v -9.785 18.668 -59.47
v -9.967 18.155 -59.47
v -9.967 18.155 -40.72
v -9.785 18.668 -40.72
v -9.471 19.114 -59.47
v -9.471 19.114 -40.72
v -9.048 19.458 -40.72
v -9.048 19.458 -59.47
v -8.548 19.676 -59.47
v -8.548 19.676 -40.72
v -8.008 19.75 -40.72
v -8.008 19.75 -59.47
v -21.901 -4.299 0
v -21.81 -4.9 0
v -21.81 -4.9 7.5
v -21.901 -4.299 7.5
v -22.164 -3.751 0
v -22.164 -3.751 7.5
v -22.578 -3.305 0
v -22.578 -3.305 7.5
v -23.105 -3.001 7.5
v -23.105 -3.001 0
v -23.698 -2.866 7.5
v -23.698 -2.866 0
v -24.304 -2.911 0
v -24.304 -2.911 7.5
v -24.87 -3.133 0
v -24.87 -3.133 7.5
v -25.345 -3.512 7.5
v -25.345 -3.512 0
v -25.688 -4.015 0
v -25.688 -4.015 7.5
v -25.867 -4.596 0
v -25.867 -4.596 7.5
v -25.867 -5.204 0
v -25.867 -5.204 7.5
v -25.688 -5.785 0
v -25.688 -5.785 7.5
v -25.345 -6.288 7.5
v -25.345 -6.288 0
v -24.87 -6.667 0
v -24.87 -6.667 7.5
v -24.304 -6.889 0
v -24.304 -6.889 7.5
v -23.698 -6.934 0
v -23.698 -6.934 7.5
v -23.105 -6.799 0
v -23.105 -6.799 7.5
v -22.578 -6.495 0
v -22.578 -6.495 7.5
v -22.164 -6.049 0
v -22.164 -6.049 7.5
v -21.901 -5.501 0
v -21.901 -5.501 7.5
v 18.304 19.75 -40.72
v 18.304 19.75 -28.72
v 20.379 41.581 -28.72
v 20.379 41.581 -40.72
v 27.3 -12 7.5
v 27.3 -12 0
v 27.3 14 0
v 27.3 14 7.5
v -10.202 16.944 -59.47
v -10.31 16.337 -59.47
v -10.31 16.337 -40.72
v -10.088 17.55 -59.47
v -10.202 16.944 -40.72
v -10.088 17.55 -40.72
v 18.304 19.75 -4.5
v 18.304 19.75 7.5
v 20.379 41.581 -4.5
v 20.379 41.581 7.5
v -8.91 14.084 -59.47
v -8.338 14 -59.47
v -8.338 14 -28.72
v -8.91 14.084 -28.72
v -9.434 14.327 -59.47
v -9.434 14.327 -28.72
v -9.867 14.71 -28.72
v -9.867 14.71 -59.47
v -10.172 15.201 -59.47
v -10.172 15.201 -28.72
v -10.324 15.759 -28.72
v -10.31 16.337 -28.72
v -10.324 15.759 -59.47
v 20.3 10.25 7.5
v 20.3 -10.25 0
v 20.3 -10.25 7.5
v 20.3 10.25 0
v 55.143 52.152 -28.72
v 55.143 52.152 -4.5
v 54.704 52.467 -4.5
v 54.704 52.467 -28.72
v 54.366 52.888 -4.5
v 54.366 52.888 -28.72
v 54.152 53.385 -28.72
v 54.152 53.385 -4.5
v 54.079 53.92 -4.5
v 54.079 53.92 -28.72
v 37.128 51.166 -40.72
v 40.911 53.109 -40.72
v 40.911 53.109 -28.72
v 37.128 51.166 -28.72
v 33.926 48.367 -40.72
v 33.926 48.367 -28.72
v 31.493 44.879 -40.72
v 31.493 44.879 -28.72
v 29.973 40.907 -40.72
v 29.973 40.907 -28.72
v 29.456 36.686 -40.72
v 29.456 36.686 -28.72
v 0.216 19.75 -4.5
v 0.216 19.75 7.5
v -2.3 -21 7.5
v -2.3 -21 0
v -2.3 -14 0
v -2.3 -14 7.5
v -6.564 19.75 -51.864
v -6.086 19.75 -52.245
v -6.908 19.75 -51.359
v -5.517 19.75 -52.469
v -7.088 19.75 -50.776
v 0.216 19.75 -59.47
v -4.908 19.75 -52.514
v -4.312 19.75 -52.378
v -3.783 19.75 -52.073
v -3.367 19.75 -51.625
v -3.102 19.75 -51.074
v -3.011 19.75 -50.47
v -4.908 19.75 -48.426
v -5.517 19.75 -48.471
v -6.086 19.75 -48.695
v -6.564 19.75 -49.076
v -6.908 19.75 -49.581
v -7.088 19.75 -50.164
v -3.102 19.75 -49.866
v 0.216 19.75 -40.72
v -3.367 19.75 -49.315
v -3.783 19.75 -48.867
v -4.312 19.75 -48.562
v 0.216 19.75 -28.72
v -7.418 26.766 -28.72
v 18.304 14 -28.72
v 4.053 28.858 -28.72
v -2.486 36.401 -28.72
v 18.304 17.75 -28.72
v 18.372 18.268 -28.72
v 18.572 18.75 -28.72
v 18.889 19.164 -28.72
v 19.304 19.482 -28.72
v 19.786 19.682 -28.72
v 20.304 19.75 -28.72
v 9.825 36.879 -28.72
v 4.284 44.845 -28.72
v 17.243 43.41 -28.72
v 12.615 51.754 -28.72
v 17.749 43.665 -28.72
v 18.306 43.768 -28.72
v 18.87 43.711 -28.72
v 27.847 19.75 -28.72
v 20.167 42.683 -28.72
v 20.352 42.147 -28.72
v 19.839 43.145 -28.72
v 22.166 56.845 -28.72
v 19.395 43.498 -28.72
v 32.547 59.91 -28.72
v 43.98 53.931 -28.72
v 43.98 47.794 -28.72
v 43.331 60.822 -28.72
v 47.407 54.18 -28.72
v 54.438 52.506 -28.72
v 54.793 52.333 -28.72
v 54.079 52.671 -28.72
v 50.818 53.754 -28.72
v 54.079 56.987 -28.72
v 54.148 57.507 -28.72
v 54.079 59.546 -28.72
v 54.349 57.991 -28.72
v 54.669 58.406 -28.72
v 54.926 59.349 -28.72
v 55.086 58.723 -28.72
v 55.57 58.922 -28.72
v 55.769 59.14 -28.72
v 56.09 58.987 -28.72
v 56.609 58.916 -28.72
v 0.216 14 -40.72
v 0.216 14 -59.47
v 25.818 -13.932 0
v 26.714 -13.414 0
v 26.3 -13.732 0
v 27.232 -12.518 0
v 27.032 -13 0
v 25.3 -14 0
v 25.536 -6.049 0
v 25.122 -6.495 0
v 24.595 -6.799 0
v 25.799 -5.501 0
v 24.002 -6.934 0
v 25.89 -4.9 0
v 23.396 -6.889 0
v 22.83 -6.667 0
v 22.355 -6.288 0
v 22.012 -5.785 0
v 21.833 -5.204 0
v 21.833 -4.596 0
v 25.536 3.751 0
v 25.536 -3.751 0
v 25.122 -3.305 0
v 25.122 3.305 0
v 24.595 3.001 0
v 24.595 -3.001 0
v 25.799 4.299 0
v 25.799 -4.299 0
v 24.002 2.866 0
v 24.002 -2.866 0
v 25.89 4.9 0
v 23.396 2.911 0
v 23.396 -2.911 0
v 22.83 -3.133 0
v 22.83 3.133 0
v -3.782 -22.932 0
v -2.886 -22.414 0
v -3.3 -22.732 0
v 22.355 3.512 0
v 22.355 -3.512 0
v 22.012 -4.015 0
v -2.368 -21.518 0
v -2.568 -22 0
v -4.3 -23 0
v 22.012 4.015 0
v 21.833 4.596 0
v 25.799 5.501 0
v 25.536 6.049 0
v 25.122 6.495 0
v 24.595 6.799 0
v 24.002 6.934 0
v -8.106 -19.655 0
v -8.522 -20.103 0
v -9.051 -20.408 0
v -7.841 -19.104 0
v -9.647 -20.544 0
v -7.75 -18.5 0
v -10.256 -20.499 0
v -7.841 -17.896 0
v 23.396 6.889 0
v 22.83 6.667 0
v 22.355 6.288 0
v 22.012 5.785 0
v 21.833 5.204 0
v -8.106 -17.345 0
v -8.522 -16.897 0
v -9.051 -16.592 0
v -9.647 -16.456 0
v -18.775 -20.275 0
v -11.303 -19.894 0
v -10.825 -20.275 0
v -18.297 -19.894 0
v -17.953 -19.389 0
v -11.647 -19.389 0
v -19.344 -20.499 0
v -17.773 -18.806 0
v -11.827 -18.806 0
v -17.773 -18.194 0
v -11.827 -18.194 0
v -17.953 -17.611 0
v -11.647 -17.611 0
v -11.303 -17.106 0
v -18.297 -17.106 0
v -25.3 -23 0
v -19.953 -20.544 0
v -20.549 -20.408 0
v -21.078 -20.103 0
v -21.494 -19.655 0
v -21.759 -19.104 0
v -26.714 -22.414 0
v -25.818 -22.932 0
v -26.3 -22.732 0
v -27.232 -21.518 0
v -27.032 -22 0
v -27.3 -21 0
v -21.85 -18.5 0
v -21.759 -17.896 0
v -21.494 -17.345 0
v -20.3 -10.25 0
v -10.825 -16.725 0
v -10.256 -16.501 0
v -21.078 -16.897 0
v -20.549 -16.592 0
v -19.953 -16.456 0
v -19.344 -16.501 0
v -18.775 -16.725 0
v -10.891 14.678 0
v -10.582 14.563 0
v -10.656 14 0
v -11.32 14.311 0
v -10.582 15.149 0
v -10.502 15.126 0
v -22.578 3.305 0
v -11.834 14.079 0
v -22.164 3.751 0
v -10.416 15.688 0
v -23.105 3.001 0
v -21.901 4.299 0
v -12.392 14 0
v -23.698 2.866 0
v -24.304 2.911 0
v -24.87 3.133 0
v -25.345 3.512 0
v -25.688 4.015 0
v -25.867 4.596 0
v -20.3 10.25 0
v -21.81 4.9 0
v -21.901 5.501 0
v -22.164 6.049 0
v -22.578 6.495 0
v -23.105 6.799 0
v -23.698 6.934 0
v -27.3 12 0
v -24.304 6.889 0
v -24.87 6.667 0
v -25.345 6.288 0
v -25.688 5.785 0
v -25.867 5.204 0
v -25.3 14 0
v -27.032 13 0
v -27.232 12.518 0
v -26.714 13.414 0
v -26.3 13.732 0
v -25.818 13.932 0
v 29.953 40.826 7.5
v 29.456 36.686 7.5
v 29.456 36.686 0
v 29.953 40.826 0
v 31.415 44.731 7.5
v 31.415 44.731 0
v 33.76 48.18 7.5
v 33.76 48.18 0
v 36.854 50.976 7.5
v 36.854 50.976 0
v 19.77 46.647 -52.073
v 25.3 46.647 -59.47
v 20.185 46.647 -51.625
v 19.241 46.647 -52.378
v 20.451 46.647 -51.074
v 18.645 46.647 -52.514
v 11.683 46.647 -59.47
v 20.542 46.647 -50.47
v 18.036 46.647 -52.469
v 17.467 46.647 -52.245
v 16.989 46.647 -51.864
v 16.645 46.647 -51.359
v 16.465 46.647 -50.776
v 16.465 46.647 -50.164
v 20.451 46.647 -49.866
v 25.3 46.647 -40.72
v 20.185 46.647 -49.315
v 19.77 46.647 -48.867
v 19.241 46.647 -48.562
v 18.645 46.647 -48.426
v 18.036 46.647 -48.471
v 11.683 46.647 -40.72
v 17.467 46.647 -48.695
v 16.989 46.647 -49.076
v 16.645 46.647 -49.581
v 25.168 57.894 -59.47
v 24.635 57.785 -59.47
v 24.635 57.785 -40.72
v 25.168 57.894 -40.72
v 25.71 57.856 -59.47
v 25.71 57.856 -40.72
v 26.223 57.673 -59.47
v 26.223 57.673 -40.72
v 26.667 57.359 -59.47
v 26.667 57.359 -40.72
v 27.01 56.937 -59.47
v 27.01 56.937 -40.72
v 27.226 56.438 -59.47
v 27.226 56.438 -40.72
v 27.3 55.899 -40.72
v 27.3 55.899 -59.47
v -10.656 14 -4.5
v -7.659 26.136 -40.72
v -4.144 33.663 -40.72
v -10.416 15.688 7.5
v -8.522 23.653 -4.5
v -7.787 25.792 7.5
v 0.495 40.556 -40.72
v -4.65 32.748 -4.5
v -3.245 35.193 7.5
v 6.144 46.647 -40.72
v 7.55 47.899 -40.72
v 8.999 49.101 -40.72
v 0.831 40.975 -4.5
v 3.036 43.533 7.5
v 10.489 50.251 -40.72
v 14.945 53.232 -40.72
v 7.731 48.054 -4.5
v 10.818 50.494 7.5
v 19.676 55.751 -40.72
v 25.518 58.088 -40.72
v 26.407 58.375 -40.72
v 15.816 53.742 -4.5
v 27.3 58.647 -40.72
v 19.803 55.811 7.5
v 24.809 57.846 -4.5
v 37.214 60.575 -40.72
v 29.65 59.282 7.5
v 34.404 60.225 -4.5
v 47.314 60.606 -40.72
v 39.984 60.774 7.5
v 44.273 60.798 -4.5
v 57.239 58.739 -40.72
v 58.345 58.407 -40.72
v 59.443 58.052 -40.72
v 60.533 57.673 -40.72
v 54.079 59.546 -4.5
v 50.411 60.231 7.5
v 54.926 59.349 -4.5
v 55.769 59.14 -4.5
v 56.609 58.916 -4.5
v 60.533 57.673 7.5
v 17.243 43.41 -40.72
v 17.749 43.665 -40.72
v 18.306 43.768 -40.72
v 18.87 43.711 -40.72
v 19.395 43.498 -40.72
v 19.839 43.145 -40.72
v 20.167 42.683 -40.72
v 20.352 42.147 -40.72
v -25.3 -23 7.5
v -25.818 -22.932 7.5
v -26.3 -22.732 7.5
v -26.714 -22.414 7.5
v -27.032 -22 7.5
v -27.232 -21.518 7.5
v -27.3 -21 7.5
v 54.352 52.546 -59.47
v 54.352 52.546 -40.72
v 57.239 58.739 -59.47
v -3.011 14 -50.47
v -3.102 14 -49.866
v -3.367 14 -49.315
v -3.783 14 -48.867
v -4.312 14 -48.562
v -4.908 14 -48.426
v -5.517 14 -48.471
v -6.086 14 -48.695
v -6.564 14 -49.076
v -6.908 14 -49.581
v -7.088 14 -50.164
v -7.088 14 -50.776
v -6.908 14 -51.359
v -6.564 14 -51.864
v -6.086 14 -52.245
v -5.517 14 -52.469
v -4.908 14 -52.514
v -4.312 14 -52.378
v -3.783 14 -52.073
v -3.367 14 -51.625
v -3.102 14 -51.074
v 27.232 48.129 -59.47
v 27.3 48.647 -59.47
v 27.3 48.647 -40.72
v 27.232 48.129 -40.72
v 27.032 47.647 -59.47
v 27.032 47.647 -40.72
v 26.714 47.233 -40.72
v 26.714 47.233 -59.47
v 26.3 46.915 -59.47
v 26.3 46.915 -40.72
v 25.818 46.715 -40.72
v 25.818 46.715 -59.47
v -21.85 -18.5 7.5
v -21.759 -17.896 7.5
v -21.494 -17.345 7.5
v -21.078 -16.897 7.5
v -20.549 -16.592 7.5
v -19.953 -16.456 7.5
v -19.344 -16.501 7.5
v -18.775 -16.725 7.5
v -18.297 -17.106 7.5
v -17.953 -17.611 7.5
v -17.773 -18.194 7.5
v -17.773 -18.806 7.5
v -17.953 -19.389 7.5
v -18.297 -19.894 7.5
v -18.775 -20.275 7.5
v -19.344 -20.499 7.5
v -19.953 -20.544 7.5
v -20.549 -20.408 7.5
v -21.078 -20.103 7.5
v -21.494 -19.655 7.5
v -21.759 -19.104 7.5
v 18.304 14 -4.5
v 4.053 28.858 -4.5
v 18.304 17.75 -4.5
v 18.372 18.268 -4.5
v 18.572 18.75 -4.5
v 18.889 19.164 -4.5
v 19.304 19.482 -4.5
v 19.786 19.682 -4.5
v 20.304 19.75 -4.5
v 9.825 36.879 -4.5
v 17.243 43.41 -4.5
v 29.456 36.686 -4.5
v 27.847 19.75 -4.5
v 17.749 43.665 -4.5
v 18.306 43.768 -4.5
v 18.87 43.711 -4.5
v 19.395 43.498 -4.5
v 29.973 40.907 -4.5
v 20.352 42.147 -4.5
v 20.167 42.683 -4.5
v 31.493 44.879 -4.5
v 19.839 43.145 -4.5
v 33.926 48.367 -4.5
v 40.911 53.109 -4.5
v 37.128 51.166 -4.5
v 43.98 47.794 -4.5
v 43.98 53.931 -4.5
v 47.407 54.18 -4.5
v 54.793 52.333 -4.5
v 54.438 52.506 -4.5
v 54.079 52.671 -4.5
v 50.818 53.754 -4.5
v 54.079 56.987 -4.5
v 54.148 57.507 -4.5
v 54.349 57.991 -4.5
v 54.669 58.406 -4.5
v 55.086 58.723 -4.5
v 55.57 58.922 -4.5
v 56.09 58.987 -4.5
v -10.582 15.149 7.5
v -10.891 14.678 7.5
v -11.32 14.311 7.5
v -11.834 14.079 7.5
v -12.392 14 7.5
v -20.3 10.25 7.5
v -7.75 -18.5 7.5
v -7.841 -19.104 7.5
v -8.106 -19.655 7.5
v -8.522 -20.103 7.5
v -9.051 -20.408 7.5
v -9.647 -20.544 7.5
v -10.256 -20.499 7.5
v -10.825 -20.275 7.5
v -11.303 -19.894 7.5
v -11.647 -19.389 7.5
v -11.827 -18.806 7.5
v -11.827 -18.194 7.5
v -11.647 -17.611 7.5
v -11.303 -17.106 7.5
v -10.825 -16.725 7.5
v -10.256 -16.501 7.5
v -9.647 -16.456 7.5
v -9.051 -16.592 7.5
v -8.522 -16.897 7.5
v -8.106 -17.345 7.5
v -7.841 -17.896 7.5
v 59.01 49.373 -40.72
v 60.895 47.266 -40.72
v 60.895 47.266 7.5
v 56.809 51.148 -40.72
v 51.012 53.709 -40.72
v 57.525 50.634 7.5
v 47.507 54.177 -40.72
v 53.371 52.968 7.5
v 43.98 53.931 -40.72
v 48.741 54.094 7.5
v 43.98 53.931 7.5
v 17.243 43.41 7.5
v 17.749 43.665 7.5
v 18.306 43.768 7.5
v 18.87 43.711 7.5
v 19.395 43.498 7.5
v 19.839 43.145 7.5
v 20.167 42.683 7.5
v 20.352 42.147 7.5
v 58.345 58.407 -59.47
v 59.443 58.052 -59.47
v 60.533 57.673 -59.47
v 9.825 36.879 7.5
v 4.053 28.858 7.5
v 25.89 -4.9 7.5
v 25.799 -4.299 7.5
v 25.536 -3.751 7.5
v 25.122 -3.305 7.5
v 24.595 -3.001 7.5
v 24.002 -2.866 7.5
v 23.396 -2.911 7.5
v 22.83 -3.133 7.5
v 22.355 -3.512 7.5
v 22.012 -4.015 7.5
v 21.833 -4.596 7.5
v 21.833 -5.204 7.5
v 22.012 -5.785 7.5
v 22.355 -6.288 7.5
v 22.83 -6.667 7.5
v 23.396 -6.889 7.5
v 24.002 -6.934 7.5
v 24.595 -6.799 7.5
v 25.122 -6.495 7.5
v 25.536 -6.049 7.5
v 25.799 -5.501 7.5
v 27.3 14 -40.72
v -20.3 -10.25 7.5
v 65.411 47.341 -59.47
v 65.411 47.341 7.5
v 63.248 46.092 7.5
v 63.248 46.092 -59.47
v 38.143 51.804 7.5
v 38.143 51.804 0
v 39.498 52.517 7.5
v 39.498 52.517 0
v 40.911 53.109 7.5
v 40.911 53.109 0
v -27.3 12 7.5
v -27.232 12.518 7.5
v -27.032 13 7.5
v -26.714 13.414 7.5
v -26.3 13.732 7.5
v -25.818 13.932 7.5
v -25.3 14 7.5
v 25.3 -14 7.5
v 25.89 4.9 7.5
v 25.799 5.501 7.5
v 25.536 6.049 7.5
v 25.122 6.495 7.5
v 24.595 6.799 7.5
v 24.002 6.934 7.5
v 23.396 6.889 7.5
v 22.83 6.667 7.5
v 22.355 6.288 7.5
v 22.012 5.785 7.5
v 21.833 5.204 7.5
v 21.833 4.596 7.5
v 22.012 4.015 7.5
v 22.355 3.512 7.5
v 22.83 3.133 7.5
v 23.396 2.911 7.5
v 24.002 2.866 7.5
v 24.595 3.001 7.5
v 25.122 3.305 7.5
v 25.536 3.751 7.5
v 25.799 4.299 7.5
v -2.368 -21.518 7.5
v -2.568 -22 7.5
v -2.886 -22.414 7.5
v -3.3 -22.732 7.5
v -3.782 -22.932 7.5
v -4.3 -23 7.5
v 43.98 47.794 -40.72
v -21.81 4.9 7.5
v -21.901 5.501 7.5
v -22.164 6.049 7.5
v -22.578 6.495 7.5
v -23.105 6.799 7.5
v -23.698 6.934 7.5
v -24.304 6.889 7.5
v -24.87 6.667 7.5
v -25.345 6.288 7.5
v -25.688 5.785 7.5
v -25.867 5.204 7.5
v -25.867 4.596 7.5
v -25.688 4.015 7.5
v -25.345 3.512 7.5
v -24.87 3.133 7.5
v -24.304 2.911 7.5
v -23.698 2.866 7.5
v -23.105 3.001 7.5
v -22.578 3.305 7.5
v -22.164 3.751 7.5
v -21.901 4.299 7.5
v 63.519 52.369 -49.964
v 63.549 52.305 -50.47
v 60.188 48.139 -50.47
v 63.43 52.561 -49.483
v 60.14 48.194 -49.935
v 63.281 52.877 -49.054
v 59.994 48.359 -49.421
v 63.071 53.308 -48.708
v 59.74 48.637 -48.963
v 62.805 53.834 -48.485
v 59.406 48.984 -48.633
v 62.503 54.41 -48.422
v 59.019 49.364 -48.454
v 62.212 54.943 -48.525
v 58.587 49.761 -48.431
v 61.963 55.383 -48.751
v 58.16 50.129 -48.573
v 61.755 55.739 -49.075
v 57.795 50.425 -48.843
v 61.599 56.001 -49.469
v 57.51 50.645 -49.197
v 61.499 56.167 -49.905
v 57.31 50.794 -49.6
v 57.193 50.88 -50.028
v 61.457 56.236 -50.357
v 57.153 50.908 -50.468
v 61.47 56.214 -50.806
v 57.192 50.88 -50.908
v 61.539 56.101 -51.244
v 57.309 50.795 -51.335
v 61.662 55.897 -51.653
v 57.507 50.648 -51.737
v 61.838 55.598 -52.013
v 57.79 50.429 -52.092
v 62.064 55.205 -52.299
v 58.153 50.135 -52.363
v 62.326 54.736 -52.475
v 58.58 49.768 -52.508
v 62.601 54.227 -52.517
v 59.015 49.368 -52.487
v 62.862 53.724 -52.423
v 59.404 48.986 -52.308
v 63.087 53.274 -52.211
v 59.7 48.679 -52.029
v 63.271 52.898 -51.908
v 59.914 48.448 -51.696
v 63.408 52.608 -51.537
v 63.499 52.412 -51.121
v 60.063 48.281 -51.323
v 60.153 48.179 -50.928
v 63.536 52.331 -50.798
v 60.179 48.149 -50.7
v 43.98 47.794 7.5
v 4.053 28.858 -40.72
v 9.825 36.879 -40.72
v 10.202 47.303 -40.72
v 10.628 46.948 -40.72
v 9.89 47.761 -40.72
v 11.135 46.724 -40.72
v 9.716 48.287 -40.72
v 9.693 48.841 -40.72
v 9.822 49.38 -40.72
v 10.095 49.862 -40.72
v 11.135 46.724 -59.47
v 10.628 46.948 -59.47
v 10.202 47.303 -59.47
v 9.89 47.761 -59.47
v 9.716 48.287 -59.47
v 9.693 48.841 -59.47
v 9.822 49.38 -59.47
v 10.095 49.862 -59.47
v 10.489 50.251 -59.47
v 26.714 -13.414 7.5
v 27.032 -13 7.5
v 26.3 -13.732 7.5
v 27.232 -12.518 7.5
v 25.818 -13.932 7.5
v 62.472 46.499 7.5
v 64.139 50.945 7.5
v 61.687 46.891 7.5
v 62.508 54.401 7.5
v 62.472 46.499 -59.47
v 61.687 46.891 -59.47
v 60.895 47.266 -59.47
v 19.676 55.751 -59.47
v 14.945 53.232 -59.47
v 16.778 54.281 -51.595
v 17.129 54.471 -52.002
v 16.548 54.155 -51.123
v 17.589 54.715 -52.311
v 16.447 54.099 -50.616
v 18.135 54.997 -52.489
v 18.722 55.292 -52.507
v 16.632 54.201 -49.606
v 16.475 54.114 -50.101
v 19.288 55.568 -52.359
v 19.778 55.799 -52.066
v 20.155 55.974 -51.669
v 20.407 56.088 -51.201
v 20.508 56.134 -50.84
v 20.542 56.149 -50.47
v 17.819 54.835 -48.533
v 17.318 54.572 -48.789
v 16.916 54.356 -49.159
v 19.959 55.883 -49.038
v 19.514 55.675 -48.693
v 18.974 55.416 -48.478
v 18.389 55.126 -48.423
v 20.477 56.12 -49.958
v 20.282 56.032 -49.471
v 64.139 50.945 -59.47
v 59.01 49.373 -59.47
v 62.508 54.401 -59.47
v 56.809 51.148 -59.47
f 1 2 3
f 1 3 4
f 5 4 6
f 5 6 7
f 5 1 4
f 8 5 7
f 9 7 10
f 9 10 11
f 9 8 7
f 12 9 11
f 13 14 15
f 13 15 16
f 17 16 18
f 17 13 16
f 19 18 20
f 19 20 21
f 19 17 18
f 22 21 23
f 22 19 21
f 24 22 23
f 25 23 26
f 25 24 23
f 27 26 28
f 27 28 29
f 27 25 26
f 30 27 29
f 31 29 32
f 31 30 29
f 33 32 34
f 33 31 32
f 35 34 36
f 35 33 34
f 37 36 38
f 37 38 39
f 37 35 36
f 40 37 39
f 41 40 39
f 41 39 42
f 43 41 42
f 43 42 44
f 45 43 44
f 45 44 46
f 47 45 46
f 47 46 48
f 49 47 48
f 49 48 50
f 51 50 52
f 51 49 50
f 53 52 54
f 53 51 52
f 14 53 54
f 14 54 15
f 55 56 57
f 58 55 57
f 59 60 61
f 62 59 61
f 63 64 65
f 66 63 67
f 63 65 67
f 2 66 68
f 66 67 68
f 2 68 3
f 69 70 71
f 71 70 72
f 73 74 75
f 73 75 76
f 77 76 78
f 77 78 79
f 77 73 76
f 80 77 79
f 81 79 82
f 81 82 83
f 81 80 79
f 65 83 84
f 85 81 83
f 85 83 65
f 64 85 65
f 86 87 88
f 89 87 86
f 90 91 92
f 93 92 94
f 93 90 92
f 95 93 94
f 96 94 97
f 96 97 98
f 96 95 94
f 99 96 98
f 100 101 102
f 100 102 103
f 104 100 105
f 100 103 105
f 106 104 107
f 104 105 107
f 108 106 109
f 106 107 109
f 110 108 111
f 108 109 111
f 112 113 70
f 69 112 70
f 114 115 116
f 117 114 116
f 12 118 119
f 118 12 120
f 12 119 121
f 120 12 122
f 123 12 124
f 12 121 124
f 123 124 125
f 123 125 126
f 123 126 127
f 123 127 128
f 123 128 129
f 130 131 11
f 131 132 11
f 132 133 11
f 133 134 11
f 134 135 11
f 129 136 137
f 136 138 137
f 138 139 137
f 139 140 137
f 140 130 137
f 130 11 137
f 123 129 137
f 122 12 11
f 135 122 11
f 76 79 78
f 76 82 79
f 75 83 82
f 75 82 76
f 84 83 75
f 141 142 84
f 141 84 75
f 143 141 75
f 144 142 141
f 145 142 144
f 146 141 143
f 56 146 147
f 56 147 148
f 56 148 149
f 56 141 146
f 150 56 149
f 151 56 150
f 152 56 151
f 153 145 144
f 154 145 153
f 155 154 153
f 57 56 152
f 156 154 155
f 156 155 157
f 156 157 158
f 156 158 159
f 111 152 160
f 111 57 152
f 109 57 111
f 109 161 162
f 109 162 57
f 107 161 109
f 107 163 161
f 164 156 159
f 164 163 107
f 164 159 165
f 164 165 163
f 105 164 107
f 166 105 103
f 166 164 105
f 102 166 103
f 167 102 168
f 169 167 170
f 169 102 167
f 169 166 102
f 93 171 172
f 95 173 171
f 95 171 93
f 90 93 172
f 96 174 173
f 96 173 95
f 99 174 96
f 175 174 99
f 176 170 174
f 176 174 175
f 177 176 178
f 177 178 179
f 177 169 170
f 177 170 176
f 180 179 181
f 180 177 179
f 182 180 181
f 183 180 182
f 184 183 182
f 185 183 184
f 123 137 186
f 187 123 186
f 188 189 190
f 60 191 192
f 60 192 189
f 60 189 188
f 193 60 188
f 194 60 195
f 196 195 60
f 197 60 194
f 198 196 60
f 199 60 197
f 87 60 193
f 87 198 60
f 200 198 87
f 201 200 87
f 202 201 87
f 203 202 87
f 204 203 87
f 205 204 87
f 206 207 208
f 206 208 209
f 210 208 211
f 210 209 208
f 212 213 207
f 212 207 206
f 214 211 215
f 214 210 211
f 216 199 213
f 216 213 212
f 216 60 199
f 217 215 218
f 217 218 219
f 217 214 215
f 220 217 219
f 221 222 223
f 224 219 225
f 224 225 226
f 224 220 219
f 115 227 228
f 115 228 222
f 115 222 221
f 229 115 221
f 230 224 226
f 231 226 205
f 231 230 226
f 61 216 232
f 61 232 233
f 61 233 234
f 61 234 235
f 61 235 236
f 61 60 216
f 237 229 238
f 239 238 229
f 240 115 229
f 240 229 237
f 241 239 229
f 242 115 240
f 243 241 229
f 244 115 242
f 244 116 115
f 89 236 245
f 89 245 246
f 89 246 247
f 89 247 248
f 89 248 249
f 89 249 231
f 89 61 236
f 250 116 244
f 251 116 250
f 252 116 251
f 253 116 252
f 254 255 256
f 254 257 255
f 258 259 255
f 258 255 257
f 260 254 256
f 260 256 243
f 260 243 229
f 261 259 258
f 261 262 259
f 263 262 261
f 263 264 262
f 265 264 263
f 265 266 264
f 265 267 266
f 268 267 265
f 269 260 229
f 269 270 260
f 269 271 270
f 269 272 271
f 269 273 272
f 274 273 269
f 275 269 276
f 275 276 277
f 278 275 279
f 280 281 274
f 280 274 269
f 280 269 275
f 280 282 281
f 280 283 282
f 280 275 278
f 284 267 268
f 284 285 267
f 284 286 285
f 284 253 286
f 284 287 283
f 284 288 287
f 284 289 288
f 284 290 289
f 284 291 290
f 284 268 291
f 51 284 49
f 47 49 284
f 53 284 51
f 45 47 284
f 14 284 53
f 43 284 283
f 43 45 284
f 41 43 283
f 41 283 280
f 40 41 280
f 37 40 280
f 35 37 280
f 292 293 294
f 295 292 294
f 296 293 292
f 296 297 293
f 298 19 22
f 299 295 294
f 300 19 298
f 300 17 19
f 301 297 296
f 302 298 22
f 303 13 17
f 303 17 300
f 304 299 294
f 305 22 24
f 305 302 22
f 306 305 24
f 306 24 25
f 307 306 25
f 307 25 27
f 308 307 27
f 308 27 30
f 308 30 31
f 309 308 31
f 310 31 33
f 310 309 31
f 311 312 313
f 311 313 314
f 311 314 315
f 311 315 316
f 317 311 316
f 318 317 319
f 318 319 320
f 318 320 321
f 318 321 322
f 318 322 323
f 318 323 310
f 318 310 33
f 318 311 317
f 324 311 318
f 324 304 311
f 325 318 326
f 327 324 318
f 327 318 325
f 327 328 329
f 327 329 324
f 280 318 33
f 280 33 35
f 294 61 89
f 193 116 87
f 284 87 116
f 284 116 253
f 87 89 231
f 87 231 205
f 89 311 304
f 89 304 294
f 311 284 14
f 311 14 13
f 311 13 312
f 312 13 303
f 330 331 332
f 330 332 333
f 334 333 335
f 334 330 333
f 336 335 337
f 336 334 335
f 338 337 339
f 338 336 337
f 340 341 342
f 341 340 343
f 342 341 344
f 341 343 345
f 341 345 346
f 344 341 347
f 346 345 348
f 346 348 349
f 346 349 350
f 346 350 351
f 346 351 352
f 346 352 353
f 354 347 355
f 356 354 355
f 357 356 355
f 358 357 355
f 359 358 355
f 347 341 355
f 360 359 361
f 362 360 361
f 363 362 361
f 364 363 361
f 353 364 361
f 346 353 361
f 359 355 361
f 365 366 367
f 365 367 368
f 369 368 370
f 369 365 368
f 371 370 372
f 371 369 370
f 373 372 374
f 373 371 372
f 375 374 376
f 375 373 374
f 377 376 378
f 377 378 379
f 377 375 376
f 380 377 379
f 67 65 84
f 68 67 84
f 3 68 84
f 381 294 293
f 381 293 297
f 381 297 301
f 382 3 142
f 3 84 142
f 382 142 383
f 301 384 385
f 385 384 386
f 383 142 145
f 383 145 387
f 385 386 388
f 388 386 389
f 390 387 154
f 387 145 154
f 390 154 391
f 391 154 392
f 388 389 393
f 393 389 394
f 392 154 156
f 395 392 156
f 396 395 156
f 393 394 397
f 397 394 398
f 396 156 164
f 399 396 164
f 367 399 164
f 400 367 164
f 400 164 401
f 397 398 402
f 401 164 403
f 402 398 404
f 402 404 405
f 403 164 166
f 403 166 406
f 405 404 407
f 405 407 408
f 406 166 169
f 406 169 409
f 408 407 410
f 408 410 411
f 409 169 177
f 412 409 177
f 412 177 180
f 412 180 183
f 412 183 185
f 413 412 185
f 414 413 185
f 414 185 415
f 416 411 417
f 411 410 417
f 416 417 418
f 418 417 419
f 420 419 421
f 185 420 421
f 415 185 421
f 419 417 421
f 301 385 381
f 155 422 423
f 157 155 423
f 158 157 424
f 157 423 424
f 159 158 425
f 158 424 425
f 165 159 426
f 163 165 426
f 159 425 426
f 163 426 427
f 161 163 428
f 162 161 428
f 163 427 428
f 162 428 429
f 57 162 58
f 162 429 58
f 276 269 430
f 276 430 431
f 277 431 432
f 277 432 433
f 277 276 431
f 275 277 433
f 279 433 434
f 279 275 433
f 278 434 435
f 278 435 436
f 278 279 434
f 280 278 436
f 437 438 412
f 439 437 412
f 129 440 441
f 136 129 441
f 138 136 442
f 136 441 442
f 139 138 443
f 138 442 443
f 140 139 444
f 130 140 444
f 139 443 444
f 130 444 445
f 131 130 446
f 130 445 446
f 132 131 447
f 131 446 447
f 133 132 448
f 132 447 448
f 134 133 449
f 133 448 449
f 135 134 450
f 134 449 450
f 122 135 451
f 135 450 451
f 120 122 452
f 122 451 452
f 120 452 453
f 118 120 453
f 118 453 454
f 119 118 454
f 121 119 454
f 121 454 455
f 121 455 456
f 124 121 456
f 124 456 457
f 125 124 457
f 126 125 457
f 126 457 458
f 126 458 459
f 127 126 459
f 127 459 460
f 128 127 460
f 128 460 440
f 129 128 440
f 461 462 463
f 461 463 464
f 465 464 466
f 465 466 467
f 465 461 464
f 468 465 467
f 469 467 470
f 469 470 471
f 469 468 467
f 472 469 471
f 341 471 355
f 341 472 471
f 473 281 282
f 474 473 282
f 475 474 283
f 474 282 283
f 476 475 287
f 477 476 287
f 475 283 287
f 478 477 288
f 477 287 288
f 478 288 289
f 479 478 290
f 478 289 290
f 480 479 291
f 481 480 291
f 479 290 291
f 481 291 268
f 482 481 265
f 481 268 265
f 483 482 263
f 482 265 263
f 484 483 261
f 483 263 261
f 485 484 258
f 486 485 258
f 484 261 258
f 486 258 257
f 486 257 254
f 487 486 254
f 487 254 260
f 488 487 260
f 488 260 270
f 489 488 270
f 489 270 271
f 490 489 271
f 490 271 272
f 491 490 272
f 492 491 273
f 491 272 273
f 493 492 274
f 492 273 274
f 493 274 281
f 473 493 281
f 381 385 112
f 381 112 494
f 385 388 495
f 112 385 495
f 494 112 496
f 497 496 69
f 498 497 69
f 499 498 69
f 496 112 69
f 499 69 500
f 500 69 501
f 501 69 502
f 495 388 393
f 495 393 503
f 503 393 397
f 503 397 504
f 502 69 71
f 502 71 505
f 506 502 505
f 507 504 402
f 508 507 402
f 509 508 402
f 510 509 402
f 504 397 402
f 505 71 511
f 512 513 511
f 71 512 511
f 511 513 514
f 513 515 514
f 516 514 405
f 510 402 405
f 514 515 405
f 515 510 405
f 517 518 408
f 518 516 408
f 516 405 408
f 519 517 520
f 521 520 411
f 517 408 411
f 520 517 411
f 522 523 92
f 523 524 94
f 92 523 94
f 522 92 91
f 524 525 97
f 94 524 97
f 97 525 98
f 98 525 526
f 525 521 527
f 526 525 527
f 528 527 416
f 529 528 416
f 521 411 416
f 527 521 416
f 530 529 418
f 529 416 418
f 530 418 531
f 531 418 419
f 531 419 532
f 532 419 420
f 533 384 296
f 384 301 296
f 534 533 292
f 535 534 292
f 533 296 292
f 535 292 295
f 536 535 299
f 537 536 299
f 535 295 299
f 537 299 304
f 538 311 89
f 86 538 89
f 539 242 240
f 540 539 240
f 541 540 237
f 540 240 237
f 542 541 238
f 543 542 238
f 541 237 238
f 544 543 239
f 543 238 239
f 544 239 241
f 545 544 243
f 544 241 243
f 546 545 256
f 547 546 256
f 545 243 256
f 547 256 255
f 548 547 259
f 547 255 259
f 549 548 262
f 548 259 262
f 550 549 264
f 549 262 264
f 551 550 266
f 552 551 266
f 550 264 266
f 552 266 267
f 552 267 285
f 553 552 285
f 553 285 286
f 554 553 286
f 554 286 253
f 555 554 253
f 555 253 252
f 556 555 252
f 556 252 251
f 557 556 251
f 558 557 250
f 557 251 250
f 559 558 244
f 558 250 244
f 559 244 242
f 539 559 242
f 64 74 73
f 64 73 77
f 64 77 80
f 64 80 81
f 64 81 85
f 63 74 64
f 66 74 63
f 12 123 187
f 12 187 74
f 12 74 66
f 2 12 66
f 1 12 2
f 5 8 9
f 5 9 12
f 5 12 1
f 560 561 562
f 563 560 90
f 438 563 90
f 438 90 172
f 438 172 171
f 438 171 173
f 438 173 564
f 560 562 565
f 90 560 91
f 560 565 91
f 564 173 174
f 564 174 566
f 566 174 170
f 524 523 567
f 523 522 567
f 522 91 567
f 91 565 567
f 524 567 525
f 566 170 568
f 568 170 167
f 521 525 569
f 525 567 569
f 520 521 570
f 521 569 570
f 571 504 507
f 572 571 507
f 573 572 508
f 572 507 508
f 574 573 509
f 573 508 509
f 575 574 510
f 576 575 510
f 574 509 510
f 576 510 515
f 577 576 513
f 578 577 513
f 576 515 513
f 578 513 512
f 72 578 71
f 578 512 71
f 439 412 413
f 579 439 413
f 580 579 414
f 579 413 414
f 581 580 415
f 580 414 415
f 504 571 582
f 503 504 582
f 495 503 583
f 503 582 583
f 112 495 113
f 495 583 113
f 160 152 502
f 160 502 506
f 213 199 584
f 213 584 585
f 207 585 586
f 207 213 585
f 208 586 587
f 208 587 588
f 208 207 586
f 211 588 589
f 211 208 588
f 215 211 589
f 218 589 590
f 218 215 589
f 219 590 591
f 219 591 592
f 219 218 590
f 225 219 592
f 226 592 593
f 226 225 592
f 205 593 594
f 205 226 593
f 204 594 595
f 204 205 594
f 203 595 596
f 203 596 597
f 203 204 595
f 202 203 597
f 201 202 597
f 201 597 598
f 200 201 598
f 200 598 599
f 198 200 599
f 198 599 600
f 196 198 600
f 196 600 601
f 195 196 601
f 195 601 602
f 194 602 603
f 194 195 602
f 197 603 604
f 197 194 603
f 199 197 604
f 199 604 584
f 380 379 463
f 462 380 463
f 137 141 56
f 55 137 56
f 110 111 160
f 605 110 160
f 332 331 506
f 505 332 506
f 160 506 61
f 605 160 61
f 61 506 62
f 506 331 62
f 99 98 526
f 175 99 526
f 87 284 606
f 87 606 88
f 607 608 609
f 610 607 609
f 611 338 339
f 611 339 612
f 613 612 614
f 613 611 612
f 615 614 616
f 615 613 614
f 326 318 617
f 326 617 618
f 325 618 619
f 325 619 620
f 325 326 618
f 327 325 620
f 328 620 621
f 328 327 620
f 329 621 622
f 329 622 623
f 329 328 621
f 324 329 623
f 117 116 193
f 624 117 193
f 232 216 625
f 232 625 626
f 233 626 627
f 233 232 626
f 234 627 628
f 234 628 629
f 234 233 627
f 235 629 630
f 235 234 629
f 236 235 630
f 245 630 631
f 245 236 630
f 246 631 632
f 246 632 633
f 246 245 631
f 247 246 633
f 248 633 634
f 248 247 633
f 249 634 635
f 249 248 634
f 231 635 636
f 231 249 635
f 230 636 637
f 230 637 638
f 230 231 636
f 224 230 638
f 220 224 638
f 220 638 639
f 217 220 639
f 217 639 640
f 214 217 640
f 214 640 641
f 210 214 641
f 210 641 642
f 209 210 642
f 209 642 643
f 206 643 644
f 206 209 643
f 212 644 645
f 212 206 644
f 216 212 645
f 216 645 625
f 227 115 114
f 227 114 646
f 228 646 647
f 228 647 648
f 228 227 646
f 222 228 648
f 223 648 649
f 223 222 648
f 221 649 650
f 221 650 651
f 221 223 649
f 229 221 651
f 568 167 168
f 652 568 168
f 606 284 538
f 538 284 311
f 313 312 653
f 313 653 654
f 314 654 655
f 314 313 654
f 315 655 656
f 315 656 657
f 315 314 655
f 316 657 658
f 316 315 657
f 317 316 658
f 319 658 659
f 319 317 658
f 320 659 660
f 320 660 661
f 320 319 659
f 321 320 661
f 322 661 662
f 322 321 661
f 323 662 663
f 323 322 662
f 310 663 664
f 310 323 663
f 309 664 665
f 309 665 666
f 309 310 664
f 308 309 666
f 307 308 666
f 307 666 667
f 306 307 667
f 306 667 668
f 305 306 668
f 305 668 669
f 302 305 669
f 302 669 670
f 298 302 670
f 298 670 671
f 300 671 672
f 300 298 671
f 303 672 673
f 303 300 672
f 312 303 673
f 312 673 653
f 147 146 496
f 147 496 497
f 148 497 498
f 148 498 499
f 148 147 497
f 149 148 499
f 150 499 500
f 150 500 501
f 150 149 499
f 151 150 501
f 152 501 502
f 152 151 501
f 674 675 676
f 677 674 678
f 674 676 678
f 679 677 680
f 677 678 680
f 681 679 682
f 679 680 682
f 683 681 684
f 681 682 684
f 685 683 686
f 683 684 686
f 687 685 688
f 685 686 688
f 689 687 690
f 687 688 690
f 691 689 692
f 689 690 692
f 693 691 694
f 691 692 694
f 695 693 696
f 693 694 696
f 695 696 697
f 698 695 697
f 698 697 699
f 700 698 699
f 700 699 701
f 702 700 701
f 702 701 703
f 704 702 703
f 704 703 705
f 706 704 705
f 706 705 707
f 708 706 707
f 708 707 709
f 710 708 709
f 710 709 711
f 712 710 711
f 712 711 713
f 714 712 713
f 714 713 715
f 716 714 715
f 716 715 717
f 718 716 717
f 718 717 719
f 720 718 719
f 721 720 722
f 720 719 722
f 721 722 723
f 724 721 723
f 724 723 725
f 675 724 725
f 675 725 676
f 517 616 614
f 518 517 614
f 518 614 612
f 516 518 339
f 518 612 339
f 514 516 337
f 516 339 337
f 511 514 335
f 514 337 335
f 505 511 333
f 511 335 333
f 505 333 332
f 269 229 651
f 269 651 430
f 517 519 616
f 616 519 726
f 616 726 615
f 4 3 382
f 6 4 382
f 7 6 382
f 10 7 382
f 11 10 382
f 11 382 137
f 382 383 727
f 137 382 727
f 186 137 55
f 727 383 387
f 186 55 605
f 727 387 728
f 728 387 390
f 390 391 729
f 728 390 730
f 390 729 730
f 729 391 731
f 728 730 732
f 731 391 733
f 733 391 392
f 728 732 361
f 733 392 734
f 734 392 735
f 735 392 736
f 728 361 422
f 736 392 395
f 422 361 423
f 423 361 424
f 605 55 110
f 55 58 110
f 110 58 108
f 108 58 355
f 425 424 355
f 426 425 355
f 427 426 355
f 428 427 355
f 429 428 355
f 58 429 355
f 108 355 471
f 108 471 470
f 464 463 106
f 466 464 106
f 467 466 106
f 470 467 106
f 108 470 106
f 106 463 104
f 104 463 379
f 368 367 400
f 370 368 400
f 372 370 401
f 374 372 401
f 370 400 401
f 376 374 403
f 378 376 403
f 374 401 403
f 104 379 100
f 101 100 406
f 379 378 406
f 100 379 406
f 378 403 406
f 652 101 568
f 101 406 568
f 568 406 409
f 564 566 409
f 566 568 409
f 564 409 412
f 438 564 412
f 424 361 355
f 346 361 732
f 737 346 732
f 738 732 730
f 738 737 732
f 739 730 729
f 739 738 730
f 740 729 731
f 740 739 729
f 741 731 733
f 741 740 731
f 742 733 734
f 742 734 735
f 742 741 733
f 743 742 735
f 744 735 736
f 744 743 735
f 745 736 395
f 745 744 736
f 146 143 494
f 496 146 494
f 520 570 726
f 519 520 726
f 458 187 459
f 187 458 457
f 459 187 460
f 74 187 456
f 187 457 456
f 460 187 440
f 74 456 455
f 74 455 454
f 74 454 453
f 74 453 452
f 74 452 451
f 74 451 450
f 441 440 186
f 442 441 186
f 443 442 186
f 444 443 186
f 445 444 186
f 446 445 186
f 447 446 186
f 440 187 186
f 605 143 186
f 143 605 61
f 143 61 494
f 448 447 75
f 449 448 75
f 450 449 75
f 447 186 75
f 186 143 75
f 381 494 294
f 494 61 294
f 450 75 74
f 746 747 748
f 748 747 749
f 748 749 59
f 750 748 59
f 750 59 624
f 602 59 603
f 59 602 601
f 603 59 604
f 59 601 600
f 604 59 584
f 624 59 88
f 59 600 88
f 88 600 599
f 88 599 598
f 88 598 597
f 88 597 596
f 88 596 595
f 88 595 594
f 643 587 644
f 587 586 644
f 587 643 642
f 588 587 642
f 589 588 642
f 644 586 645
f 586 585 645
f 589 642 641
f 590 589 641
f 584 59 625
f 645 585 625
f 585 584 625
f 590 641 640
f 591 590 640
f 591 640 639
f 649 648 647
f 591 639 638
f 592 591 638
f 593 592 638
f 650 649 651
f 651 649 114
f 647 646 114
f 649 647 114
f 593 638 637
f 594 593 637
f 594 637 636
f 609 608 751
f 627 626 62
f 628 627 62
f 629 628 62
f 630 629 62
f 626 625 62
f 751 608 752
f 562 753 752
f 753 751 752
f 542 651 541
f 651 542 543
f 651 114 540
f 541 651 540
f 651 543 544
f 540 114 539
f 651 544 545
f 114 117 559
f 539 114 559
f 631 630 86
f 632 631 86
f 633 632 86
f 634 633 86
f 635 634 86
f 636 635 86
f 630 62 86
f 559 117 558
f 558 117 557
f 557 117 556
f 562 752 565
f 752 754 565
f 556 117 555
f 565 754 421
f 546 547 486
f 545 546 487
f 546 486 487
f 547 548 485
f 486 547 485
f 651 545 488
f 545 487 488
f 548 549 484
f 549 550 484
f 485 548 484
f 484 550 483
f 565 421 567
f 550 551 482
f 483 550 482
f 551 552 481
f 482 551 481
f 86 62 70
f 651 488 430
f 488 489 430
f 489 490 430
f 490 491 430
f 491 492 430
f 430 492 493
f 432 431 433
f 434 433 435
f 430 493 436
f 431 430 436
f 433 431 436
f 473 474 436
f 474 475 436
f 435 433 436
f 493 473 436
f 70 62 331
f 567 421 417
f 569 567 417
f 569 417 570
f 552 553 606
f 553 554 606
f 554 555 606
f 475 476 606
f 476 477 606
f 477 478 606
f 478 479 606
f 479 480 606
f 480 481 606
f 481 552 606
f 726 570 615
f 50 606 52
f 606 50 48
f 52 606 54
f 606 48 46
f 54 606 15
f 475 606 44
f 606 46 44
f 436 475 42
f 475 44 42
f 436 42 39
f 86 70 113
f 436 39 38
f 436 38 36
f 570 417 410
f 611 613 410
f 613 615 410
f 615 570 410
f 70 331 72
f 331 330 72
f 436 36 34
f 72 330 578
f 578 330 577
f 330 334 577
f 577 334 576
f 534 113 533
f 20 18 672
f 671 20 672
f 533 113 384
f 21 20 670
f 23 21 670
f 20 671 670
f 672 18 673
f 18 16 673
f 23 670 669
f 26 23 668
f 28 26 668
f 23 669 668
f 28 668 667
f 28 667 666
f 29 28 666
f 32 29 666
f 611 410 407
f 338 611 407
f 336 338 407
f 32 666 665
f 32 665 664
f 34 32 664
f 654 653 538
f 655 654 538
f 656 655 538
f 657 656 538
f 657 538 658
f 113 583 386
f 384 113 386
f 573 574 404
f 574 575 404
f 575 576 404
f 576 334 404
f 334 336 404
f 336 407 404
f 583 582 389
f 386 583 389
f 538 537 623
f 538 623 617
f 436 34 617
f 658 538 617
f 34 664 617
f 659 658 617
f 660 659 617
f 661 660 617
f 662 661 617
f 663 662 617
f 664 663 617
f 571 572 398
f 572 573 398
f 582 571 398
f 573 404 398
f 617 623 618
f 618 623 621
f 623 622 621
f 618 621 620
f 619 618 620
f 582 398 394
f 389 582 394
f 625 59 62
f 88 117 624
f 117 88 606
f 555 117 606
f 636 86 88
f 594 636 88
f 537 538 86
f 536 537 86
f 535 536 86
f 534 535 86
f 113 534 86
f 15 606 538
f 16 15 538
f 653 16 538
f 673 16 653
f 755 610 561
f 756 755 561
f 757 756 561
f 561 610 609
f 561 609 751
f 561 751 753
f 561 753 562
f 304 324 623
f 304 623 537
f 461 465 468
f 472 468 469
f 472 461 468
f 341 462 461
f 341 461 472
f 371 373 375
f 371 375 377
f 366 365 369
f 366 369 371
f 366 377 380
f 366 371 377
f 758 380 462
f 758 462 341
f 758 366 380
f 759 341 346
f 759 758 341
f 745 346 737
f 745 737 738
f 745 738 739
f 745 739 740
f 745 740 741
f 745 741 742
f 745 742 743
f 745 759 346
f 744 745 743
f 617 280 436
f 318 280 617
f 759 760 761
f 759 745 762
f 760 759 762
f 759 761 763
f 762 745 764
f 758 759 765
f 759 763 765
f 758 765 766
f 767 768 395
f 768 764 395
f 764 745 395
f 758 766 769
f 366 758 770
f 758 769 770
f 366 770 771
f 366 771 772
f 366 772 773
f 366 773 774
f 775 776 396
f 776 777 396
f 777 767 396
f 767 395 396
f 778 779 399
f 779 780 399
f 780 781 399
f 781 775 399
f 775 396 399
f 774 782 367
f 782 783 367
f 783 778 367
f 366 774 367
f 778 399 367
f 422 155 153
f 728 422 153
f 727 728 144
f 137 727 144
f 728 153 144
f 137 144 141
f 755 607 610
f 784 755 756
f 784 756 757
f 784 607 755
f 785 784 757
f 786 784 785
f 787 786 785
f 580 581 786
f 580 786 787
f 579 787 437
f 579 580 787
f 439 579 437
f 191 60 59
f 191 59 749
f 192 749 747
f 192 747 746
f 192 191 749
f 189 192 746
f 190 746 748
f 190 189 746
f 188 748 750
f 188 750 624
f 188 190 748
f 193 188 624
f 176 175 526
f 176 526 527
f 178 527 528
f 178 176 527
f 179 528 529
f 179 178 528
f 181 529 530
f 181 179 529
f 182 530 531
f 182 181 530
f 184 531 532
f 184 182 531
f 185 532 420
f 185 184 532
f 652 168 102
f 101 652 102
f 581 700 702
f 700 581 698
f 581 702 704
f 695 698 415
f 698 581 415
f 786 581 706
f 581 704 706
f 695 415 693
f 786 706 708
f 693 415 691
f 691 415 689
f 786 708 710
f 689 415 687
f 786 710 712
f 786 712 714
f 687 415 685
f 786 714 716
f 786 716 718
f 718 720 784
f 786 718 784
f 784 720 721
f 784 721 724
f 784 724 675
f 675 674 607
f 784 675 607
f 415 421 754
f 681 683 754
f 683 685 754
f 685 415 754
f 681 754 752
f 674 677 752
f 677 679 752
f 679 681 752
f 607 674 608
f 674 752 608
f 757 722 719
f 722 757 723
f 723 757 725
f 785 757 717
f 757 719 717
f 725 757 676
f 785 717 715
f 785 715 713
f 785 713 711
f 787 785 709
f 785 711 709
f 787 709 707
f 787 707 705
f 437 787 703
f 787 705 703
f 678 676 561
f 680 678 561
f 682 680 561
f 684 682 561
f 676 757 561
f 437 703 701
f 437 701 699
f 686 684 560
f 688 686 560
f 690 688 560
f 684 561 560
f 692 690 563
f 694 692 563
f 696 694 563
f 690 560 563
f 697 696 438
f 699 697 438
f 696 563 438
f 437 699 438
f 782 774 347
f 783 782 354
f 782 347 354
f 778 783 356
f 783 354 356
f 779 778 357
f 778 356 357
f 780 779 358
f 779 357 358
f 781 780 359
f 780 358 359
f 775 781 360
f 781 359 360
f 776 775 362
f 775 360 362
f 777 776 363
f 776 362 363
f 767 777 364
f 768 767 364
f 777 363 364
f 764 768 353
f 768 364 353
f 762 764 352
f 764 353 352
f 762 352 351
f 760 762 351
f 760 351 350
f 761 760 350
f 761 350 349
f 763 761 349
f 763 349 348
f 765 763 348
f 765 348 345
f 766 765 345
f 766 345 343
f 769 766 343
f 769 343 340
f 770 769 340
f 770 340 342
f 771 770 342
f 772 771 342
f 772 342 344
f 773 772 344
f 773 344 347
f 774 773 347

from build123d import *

# Parameters (mm, degrees)
SKETCH2_W           = 54.6
SKETCH2_H           = 28
SKETCH2_R           = 2.04
SKETCH2_W_2         = 40.6
SKETCH2_H_2         = 20.5
BOSS_EXTRUDE1_DEPTH = 7.5
BOSS_EXTRUDE2_DEPTH = 7.5
BOSS_EXTRUDE3_DEPTH = 40.72
SKETCH6_W           = 18.087587328
SKETCH6_H           = 12.11
SKETCH6_W_2         = 10.871882737
CUT_EXTRUDE2_DEPTH  = 75
CUT_EXTRUDE3_DEPTH  = 24.22
FILLET2_START       = -28.72
FILLET2_DEPTH       = 24.22
FILLET2_START_2     = -3.36744
FILLET2_2_DEPTH     = 11.36744
FILLET2_START_3     = -40.72
FILLET2_3_DEPTH     = 12
FILLET2_START_4     = -4.5
FILLET2_4_DEPTH     = 12
FILLET3_R           = 2
SKETCH8_W           = 25
SKETCH8_H           = 9
SKETCH8_R           = 2.05
BOSS_EXTRUDE4_DEPTH = 7.5
BOSS_EXTRUDE5_DEPTH = 18.75
FILLET5_START       = -59.47
FILLET5_DEPTH       = 18.75
FILLET5_START_2     = -40.72
FILLET5_2_DEPTH     = 12
FILLET5_START_3     = -28.72
FILLET5_3_DEPTH     = 36.72
SKETCH10_R          = 2.05
CUT_EXTRUDE4_DEPTH  = 48.75
SKETCH11_R          = 2.05
CUT_EXTRUDE5_DEPTH  = 13.75


with BuildPart() as part:
    # Sketch2 → Boss-Extrude1 (new body)
    with BuildSketch(Plane.XY):
        Rectangle(SKETCH2_W, SKETCH2_H)
        with Locations((23.85, 4.9)):
            Circle(SKETCH2_R, mode=Mode.SUBTRACT)
        with Locations((23.85, -4.9)):
            Circle(SKETCH2_R, mode=Mode.SUBTRACT)
        with Locations((-23.85, -4.9)):
            Circle(SKETCH2_R, mode=Mode.SUBTRACT)
        with Locations((-23.85, 4.9)):
            Circle(SKETCH2_R, mode=Mode.SUBTRACT)
        Rectangle(SKETCH2_W_2, SKETCH2_H_2, mode=Mode.SUBTRACT)
    extrude(amount=BOSS_EXTRUDE1_DEPTH)

    # Sketch3 → Boss-Extrude2 (add)
    with BuildSketch(Plane.XY.offset(7.5)):
        with BuildLine():
            ThreePointArc((60.895347856, 47.266361721), (62.080408935, 46.696685397), (63.247918809, 46.091853548))
            Line((63.247918809, 46.091853548), (65.410652729, 47.340508558))
            ThreePointArc((65.410652729, 47.340508558), (63.367825291, 52.693526286), (60.533352794, 57.672854393))
            ThreePointArc((60.533352794, 57.672854393), (14.45073797, 52.932517239), (-10.655780842, 14))
            Line((-10.655780842, 14), (27.3, 14))
            Line((27.3, 14), (29.456139987, 36.685790659))
            ThreePointArc((29.456139987, 36.685790659), (31.415329504, 44.731485751), (36.854221074, 50.975690388))
            ThreePointArc((36.854221074, 50.975690388), (38.81261709, 52.175562601), (40.911281353, 53.108630977))
            Line((40.911281353, 53.108630977), (43.979720969, 47.793937662))
            Line((43.979720969, 47.793937662), (43.979720969, 53.930816894))
            ThreePointArc((43.979720969, 53.930816894), (53.370921787, 52.967700083), (60.895347856, 47.266361721))
        make_face()
        with BuildLine():
            ThreePointArc((0.216101895, 19.75), (7.968248239, 34.690697157), (20.76316619, 45.627345599))
            Line((20.76316619, 45.627345599), (18.303689223, 19.75))
            Line((18.303689223, 19.75), (0.216101895, 19.75))
        make_face(mode=Mode.SUBTRACT)
    extrude(amount=-BOSS_EXTRUDE2_DEPTH)

    # Sketch4 → Boss-Extrude3 (add)
    with BuildSketch(Plane(origin=(0, 0, 0), x_dir=(-1, 0, 0), z_dir=(0, 0, -1))):
        with BuildLine():
            Line((-27.3, 14), (10.655780842, 14))
            ThreePointArc((10.655780842, 14), (-14.45073797, 52.932517239), (-60.533352794, 57.672854393))
            ThreePointArc((-60.533352794, 57.672854393), (-63.367825291, 52.693526286), (-65.410652729, 47.340508558))
            Line((-65.410652729, 47.340508558), (-63.247918809, 46.091853548))
            ThreePointArc((-63.247918809, 46.091853548), (-62.080408935, 46.696685397), (-60.895347856, 47.266361721))
            ThreePointArc((-60.895347856, 47.266361721), (-53.370921787, 52.967700083), (-43.979720969, 53.930816894))
            Line((-43.979720969, 53.930816894), (-43.979720969, 47.793937662))
            Line((-43.979720969, 47.793937662), (-40.911281353, 53.108630977))
            ThreePointArc((-40.911281353, 53.108630977), (-32.60282981, 46.697408258), (-29.456139987, 36.685790659))
            Line((-29.456139987, 36.685790659), (-27.3, 14))
        make_face()
        with BuildLine():
            ThreePointArc((-20.76316619, 45.627345599), (-7.968248239, 34.690697157), (-0.216101895, 19.75))
            Line((-0.216101895, 19.75), (-18.303689223, 19.75))
            Line((-18.303689223, 19.75), (-20.76316619, 45.627345599))
        make_face(mode=Mode.SUBTRACT)
    extrude(amount=BOSS_EXTRUDE3_DEPTH)

    # Sketch6 → Cut-Extrude2 (cut)
    with BuildSketch(Plane.XZ.offset(-14)):
        with Locations((9.259895559, -22.665)):
            Rectangle(SKETCH6_W, SKETCH6_H)
        with Locations((9.259895559, -10.555)):
            Rectangle(SKETCH6_W, SKETCH6_H)
        with Locations((-5.219839474, -10.555)):
            Rectangle(SKETCH6_W_2, SKETCH6_H)
        with Locations((-5.219839474, -22.665)):
            Rectangle(SKETCH6_W_2, SKETCH6_H)
    extrude(amount=-CUT_EXTRUDE2_DEPTH, mode=Mode.SUBTRACT)

    # Sketch7 → Cut-Extrude3 (cut)
    with BuildSketch(Plane(origin=(0, 0, -4.5), x_dir=(-1, 0, 0), z_dir=(0, 0, -1))):
        Polygon((-18.303689223, 19.75), (-27.846500896, 19.75), (-54.079071881, 47.777058416), (-54.079071881, 65.656726539), (-18.303689223, 62.002487799), align=None)
    extrude(amount=CUT_EXTRUDE3_DEPTH, mode=Mode.SUBTRACT)

    # Fillet2: read off the stored shape, not the designer's step
    # Fillet2 outline → Fillet2 (cut)
    with BuildSketch(Plane.XY.offset(FILLET2_START)):
        with BuildLine():
            ThreePointArc((55.143386559, 52.15249663), (54.365687709, 52.888463891), (54.079071881, 53.920120169))
            Line((54.079071881, 53.920120169), (54.079071881, 52.670590979))
            ThreePointArc((54.079071881, 52.670590979), (54.615611027, 52.420545294), (55.143386559, 52.15249663))
        make_face()
        with BuildLine():
            ThreePointArc((56.609256937, 58.915929333), (55.348001268, 59.246208749), (54.079071881, 59.545655852))
            Line((54.079071881, 59.545655852), (54.079071881, 56.987483377))
            ThreePointArc((54.079071881, 56.987483377), (54.866712634, 58.57813892), (56.609256937, 58.915929333))
        make_face()
        with BuildLine():
            Line((18.303689223, 19.75), (18.303689223, 17.75))
            ThreePointArc((18.303689223, 17.75), (18.88947566, 19.164213562), (20.303689223, 19.75))
            Line((20.303689223, 19.75), (18.303689223, 19.75))
        make_face()
    extrude(amount=FILLET2_DEPTH, mode=Mode.SUBTRACT)

    # Fillet2 2 outline → Fillet2 2 (cut)
    with BuildSketch(Plane.XY.offset(FILLET2_START_2)):
        with BuildLine():
            Line((-27.3, 14), (-27.3, 12))
            ThreePointArc((-27.3, 12), (-26.714213562, 13.414213562), (-25.3, 14))
            Line((-25.3, 14), (-27.3, 14))
        make_face()
        with BuildLine():
            ThreePointArc((27.3, -12), (26.714213562, -13.414213562), (25.3, -14))
            Line((25.3, -14), (27.3, -14))
            Line((27.3, -14), (27.3, -12))
        make_face()
    extrude(amount=FILLET2_2_DEPTH, mode=Mode.SUBTRACT)

    # Fillet2 3 outline → Fillet2 3 (add)
    with BuildSketch(Plane.XY.offset(FILLET2_START_3)):
        with BuildLine():
            ThreePointArc((17.242809806, 43.409998621), (19.395297177, 43.497545876), (20.378564388, 41.5807642))
            Line((20.378564388, 41.5807642), (20.76316619, 45.627345599))
            ThreePointArc((20.76316619, 45.627345599), (18.976765346, 44.560304331), (17.242809806, 43.409998621))
        make_face()
    extrude(amount=FILLET2_3_DEPTH)

    # Fillet2 4 outline → Fillet2 4 (add)
    with BuildSketch(Plane.XY.offset(FILLET2_START_4)):
        with BuildLine():
            ThreePointArc((17.242809806, 43.409998621), (19.395297177, 43.497545876), (20.378564388, 41.5807642))
            Line((20.378564388, 41.5807642), (20.76316619, 45.627345599))
            ThreePointArc((20.76316619, 45.627345599), (18.976765346, 44.560304331), (17.242809806, 43.409998621))
        make_face()
    extrude(amount=FILLET2_4_DEPTH)

    # Fillet3
    fillet3_edges = [part.edges().sort_by_distance(p)[0] for p in [
        (-10.655780842, 14, 3.75),
    ]]
    fillet(fillet3_edges, radius=FILLET3_R)

    # Sketch8 → Boss-Extrude4 (add)
    with BuildSketch(Plane(origin=(0, 0, 0), x_dir=(-1, 0, 0), z_dir=(0, 0, -1))):
        with Locations((14.8, -18.5)):
            Rectangle(SKETCH8_W, SKETCH8_H)
        with Locations((19.8, -18.5)):
            Circle(SKETCH8_R, mode=Mode.SUBTRACT)
        with Locations(Location((9.8, -18.5, 0), (0, 0, 180))):
            Circle(SKETCH8_R, mode=Mode.SUBTRACT)
    extrude(amount=-BOSS_EXTRUDE4_DEPTH)

    # Sketch9 → Boss-Extrude5 (add)
    with BuildSketch(Plane(origin=(0, 0, -40.72), x_dir=(-1, 0, 0), z_dir=(0, 0, -1))):
        with BuildLine():
            Line((9.611579134, 19.75), (-0.216101895, 19.75))
            Line((-0.216101895, 19.75), (-0.216101895, 14))
            Line((-0.216101895, 14), (10.655780842, 14))
            ThreePointArc((10.655780842, 14), (10.212250908, 16.889268502), (9.611579134, 19.75))
        make_face()
        with BuildLine():
            Line((-27.3, 46.646953525), (-6.144205282, 46.646953525))
            ThreePointArc((-6.144205282, 46.646953525), (-16.03112882, 53.865128552), (-27.3, 58.646953525))
            Line((-27.3, 58.646953525), (-27.3, 46.646953525))
        make_face()
        with BuildLine():
            Line((-54.351959568, 52.546176932), (-57.239489727, 58.738505342))
            ThreePointArc((-57.239489727, 58.738505342), (-58.895043232, 58.232329863), (-60.533352794, 57.672854393))
            ThreePointArc((-60.533352794, 57.672854393), (-63.367825291, 52.693526286), (-65.410652729, 47.340508558))
            Line((-65.410652729, 47.340508558), (-63.247918809, 46.091853548))
            ThreePointArc((-63.247918809, 46.091853548), (-62.080408935, 46.696685397), (-60.895347856, 47.266361721))
            ThreePointArc((-60.895347856, 47.266361721), (-57.945451214, 50.305079876), (-54.351959568, 52.546176932))
        make_face()
    extrude(amount=BOSS_EXTRUDE5_DEPTH)

    # Fillet5: read off the stored shape, not the designer's step
    # Fillet5 outline → Fillet5 (cut)
    with BuildSketch(Plane.XY.offset(FILLET5_START)):
        with BuildLine():
            ThreePointArc((-8.338152673, 14), (-9.866779191, 14.710309738), (-10.309607406, 16.336699029))
            ThreePointArc((-10.309607406, 16.336699029), (-10.49559232, 15.170260335), (-10.655780842, 14))
            Line((-10.655780842, 14), (-8.338152673, 14))
        make_face()
        with BuildLine():
            ThreePointArc((10.489442502, 50.25149541), (8.269243735, 48.506581845), (6.144205282, 46.646953525))
            Line((6.144205282, 46.646953525), (11.683362659, 46.646953525))
            ThreePointArc((11.683362659, 46.646953525), (9.784799548, 48.018098919), (10.489442502, 50.25149541))
        make_face()
        with BuildLine():
            ThreePointArc((-9.96667316, 18.154660194), (-9.271106016, 19.30069668), (-8.008038399, 19.75))
            Line((-8.008038399, 19.75), (-9.611579134, 19.75))
            ThreePointArc((-9.611579134, 19.75), (-9.795218542, 18.953686155), (-9.96667316, 18.154660194))
        make_face()
        with BuildLine():
            ThreePointArc((27.3, 58.646953525), (25.961797954, 58.233374024), (24.634881293, 57.784904523))
            ThreePointArc((24.634881293, 57.784904523), (26.45537063, 57.531258997), (27.3, 55.898739868))
            Line((27.3, 55.898739868), (27.3, 58.646953525))
        make_face()
        with BuildLine():
            ThreePointArc((27.3, 48.646953525), (26.714213562, 47.232739963), (25.3, 46.646953525))
            Line((25.3, 46.646953525), (27.3, 46.646953525))
            Line((27.3, 46.646953525), (27.3, 48.646953525))
        make_face()
    extrude(amount=FILLET5_DEPTH, mode=Mode.SUBTRACT)

    # Fillet5 2 outline → Fillet5 2 (cut)
    with BuildSketch(Plane.XY.offset(FILLET5_START_2)):
        with BuildLine():
            ThreePointArc((-8.338152673, 14), (-9.866779191, 14.710309738), (-10.309607406, 16.336699029))
            ThreePointArc((-10.309607406, 16.336699029), (-10.49559232, 15.170260335), (-10.655780842, 14))
            Line((-10.655780842, 14), (-8.338152673, 14))
        make_face()
    extrude(amount=FILLET5_2_DEPTH, mode=Mode.SUBTRACT)

    # Fillet5 3 outline → Fillet5 3 (cut)
    with BuildSketch(Plane.XY.offset(FILLET5_START_3)):
        with BuildLine():
            Line((-2.3, -23), (-2.3, -21))
            ThreePointArc((-2.3, -21), (-2.885786438, -22.414213562), (-4.3, -23))
            Line((-4.3, -23), (-2.3, -23))
        make_face()
        with BuildLine():
            Line((-27.3, -23), (-25.3, -23))
            ThreePointArc((-25.3, -23), (-26.714213562, -22.414213562), (-27.3, -21))
            Line((-27.3, -21), (-27.3, -23))
        make_face()
    extrude(amount=FILLET5_3_DEPTH, mode=Mode.SUBTRACT)

    # Sketch10 → Cut-Extrude4 (cut)
    with BuildSketch(Plane.XZ.offset(-14)):
        with Locations((-5.061025389, -50.47)):
            Circle(SKETCH10_R)
        with Locations((18.491681329, -50.47)):
            Circle(SKETCH10_R)
    extrude(amount=-CUT_EXTRUDE4_DEPTH, mode=Mode.SUBTRACT)

    # Sketch11 → Cut-Extrude5 (cut)
    with BuildSketch(Plane(origin=(47.112556242, 58.387601913, 0), x_dir=(-0.7782450980918282, 0.6279606415182729, 0), z_dir=(-0.6279606415182729, -0.7782450980918282, 0))):
        with Locations(Location((-14.561184245, 50.47, 0), (0, 0, 180))):
            Circle(SKETCH11_R)
    extrude(amount=-CUT_EXTRUDE5_DEPTH, mode=Mode.SUBTRACT)


solid = part.part
